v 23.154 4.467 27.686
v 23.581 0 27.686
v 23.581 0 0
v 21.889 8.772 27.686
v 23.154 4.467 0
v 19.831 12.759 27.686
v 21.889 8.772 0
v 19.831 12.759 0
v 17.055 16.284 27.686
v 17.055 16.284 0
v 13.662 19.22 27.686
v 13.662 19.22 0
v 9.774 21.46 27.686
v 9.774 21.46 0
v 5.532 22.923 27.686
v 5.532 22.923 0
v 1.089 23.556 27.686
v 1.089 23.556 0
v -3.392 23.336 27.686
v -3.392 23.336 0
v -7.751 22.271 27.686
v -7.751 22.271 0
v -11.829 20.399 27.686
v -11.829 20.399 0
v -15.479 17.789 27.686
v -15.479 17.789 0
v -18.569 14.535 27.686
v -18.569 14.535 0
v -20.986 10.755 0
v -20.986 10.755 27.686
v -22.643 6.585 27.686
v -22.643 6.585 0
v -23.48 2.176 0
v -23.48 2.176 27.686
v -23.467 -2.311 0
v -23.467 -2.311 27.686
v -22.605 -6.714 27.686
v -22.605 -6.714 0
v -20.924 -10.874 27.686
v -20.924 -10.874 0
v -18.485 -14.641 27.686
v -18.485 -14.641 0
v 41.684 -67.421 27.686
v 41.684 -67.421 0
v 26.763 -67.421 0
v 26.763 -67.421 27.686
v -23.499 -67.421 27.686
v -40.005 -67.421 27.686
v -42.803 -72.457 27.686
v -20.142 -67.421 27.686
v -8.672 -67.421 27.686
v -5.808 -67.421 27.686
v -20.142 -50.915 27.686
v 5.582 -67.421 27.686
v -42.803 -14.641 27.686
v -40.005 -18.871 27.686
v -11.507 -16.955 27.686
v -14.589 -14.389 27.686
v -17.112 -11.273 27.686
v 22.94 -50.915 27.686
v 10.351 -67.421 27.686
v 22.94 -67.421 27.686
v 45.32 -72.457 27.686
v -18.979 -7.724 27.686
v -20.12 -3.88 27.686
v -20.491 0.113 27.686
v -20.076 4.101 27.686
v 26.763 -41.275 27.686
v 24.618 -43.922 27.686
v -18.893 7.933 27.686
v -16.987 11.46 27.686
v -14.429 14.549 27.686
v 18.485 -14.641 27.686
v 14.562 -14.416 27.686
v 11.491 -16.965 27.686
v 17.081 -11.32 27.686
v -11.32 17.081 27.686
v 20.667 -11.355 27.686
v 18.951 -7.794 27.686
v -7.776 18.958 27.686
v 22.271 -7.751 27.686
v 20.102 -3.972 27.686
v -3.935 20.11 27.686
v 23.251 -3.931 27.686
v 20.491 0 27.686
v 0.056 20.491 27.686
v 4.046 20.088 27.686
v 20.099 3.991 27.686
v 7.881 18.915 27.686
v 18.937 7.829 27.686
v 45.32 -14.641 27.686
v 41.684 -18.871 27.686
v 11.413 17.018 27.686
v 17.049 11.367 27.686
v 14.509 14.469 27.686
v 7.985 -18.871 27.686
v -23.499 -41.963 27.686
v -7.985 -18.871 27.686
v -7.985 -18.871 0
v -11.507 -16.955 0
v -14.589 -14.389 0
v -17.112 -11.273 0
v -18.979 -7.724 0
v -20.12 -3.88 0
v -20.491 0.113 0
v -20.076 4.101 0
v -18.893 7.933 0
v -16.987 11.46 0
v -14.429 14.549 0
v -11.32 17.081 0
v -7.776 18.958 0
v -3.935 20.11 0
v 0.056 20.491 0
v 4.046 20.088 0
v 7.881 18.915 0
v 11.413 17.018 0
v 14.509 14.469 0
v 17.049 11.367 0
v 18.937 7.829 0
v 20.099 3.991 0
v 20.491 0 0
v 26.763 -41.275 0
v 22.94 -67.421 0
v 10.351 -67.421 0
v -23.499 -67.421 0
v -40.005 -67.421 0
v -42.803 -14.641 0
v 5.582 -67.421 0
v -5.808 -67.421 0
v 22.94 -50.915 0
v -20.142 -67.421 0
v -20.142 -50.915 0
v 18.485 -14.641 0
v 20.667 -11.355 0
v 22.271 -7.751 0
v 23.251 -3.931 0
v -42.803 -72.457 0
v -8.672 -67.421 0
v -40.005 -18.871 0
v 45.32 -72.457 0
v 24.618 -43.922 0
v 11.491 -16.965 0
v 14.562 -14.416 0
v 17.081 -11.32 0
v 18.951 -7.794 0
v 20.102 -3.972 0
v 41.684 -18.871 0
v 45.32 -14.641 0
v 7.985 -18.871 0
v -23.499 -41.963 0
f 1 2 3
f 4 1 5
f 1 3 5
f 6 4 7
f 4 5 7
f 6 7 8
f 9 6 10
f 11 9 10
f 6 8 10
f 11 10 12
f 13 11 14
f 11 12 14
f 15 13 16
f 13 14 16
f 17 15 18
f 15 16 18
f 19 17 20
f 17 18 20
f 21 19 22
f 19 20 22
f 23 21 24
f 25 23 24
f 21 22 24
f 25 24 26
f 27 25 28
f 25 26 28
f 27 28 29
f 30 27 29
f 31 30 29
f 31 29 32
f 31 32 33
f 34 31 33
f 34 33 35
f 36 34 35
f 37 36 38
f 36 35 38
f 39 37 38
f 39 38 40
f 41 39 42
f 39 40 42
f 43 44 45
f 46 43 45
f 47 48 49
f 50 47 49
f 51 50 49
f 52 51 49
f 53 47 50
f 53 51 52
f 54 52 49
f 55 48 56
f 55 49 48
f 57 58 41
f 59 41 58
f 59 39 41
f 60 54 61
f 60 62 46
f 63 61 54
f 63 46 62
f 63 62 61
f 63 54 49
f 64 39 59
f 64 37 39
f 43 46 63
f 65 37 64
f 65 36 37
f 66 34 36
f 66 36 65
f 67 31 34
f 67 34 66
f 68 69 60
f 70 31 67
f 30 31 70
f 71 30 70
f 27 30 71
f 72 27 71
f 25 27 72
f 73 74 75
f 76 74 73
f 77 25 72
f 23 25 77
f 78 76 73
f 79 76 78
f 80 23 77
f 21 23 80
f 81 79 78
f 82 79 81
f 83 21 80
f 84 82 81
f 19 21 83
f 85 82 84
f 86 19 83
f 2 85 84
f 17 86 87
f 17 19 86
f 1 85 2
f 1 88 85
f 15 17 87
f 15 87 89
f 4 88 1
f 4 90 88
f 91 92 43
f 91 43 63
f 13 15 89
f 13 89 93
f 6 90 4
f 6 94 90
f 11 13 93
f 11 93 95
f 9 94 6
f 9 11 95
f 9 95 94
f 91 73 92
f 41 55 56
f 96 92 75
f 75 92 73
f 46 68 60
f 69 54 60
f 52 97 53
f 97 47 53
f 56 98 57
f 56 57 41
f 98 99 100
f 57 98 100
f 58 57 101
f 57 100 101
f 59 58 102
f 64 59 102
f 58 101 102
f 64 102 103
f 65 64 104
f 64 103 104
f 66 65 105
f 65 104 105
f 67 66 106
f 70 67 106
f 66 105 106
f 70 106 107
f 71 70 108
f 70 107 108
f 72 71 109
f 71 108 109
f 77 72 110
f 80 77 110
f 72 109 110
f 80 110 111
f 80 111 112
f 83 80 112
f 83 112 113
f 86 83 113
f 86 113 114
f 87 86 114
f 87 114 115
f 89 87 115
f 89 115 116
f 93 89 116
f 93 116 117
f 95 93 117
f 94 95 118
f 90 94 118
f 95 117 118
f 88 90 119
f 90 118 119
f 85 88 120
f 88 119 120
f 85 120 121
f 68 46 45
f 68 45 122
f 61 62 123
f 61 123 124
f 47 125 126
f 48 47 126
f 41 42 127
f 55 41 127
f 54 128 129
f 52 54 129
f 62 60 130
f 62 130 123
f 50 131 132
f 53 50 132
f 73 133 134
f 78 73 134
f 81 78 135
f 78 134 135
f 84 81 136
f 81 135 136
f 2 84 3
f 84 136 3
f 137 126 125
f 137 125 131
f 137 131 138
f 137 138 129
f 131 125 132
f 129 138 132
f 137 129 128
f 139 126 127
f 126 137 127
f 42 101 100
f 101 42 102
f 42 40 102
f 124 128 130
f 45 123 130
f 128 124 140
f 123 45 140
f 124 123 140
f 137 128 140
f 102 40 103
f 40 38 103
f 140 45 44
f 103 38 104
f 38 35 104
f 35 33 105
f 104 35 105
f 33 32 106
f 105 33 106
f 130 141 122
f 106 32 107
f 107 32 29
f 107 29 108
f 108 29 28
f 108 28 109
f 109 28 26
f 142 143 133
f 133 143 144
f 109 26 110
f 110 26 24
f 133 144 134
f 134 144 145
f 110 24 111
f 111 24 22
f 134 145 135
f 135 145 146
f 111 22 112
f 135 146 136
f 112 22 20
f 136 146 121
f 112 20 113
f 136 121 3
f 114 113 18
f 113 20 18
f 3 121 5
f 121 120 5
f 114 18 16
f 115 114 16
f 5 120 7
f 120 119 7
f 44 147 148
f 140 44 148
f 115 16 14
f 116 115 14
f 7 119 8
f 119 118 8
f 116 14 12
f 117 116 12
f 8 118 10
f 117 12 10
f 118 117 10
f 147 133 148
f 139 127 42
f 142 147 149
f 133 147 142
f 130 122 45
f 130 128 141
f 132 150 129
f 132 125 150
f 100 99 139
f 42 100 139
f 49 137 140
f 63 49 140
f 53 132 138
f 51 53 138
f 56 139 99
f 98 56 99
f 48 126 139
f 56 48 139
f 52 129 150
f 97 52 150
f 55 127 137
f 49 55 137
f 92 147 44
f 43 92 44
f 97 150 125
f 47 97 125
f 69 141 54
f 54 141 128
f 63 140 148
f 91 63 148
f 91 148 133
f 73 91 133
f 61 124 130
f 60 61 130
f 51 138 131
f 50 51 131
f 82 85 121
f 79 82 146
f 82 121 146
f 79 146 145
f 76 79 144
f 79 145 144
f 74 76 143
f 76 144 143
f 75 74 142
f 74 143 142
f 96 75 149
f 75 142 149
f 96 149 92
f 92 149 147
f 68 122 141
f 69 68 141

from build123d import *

# Parameters (mm, degrees)
F1_DEPTH = 27.686


with BuildPart() as f1:
    # F0 (on Top) → F1 (new body)
    with BuildSketch(Plane.XY):
        with BuildLine():
            ThreePointArc((-7.984679, -18.871297), (-11.319605, 17.080618), (20.490997, 0))
            ThreePointArc((20.490997, 0), (17.080618, -11.319605), (7.984679, -18.871297))
            Line((7.984679, -18.871297), (14.139757, -18.871297))
            ThreePointArc((14.139757, -18.871297), (16.449072, -16.896349), (18.485251, -14.640837))
            ThreePointArc((18.485251, -14.640837), (22.270579, -7.751124), (23.580895, 0))
            ThreePointArc((23.580895, 0), (-7.751124, 22.270579), (-18.485251, -14.640837))
            ThreePointArc((-18.485251, -14.640837), (-16.449072, -16.896349), (-14.139757, -18.871297))
            Line((-14.139757, -18.871297), (-7.984679, -18.871297))
        make_face()
        with BuildLine():
            Line((-40.005073, -18.871297), (-14.139757, -18.871297))
            ThreePointArc((-14.139757, -18.871297), (-16.449072, -16.896349), (-18.485251, -14.640837))
            Line((-18.485251, -14.640837), (-42.802565, -14.640837))
            Line((-42.802565, -14.640837), (-42.802565, -72.456613))
            Line((-42.802565, -72.456613), (-23.49944, -72.456613))
            Line((-23.49944, -72.456613), (-23.49944, -67.421012))
            Line((-23.49944, -67.421012), (-40.005073, -67.421012))
            Line((-40.005073, -67.421012), (-40.005073, -18.871297))
        make_face()
        with BuildLine():
            ThreePointArc((18.485251, -14.640837), (16.449072, -16.896349), (14.139757, -18.871297))
            Line((14.139757, -18.871297), (41.683532, -18.871297))
            Line((41.683532, -18.871297), (41.683532, -67.421012))
            Line((41.683532, -67.421012), (26.762667, -67.421012))
            Line((26.762667, -67.421012), (26.762667, -72.456613))
            Line((26.762667, -72.456613), (45.320351, -72.456613))
            Line((45.320351, -72.456613), (45.320351, -14.640837))
            Line((45.320351, -14.640837), (18.485251, -14.640837))
        make_face()
        Polygon((-20.142378, -67.421012), (-23.49944, -67.421012), (-23.49944, -72.456613), (-2.309161, -72.456613), (-5.808478, -67.421012), (-8.672413, -67.421012), align=None)
        Polygon((26.762667, -72.456613), (26.762667, -67.421012), (22.93993, -67.421012), (10.350944, -67.421012), (5.582281, -67.421012), (1.503095, -72.456613), (5.31535, -72.456613), align=None)
        Polygon((-5.808478, -67.421012), (-2.309161, -72.456613), (1.503095, -72.456613), (5.582281, -67.421012), align=None)
        Polygon((22.93993, -67.421012), (26.762667, -67.421012), (26.762667, -41.274629), (24.61846, -43.921571), (5.582281, -67.421012), (10.350944, -67.421012), (22.93993, -50.915454), align=None)
        Polygon((-23.49944, -41.963287), (-23.49944, -67.421012), (-20.142378, -67.421012), (-20.142378, -50.915454), (-8.672413, -67.421012), (-5.808478, -67.421012), align=None)
    extrude(amount=F1_DEPTH)


solid = f1.part
